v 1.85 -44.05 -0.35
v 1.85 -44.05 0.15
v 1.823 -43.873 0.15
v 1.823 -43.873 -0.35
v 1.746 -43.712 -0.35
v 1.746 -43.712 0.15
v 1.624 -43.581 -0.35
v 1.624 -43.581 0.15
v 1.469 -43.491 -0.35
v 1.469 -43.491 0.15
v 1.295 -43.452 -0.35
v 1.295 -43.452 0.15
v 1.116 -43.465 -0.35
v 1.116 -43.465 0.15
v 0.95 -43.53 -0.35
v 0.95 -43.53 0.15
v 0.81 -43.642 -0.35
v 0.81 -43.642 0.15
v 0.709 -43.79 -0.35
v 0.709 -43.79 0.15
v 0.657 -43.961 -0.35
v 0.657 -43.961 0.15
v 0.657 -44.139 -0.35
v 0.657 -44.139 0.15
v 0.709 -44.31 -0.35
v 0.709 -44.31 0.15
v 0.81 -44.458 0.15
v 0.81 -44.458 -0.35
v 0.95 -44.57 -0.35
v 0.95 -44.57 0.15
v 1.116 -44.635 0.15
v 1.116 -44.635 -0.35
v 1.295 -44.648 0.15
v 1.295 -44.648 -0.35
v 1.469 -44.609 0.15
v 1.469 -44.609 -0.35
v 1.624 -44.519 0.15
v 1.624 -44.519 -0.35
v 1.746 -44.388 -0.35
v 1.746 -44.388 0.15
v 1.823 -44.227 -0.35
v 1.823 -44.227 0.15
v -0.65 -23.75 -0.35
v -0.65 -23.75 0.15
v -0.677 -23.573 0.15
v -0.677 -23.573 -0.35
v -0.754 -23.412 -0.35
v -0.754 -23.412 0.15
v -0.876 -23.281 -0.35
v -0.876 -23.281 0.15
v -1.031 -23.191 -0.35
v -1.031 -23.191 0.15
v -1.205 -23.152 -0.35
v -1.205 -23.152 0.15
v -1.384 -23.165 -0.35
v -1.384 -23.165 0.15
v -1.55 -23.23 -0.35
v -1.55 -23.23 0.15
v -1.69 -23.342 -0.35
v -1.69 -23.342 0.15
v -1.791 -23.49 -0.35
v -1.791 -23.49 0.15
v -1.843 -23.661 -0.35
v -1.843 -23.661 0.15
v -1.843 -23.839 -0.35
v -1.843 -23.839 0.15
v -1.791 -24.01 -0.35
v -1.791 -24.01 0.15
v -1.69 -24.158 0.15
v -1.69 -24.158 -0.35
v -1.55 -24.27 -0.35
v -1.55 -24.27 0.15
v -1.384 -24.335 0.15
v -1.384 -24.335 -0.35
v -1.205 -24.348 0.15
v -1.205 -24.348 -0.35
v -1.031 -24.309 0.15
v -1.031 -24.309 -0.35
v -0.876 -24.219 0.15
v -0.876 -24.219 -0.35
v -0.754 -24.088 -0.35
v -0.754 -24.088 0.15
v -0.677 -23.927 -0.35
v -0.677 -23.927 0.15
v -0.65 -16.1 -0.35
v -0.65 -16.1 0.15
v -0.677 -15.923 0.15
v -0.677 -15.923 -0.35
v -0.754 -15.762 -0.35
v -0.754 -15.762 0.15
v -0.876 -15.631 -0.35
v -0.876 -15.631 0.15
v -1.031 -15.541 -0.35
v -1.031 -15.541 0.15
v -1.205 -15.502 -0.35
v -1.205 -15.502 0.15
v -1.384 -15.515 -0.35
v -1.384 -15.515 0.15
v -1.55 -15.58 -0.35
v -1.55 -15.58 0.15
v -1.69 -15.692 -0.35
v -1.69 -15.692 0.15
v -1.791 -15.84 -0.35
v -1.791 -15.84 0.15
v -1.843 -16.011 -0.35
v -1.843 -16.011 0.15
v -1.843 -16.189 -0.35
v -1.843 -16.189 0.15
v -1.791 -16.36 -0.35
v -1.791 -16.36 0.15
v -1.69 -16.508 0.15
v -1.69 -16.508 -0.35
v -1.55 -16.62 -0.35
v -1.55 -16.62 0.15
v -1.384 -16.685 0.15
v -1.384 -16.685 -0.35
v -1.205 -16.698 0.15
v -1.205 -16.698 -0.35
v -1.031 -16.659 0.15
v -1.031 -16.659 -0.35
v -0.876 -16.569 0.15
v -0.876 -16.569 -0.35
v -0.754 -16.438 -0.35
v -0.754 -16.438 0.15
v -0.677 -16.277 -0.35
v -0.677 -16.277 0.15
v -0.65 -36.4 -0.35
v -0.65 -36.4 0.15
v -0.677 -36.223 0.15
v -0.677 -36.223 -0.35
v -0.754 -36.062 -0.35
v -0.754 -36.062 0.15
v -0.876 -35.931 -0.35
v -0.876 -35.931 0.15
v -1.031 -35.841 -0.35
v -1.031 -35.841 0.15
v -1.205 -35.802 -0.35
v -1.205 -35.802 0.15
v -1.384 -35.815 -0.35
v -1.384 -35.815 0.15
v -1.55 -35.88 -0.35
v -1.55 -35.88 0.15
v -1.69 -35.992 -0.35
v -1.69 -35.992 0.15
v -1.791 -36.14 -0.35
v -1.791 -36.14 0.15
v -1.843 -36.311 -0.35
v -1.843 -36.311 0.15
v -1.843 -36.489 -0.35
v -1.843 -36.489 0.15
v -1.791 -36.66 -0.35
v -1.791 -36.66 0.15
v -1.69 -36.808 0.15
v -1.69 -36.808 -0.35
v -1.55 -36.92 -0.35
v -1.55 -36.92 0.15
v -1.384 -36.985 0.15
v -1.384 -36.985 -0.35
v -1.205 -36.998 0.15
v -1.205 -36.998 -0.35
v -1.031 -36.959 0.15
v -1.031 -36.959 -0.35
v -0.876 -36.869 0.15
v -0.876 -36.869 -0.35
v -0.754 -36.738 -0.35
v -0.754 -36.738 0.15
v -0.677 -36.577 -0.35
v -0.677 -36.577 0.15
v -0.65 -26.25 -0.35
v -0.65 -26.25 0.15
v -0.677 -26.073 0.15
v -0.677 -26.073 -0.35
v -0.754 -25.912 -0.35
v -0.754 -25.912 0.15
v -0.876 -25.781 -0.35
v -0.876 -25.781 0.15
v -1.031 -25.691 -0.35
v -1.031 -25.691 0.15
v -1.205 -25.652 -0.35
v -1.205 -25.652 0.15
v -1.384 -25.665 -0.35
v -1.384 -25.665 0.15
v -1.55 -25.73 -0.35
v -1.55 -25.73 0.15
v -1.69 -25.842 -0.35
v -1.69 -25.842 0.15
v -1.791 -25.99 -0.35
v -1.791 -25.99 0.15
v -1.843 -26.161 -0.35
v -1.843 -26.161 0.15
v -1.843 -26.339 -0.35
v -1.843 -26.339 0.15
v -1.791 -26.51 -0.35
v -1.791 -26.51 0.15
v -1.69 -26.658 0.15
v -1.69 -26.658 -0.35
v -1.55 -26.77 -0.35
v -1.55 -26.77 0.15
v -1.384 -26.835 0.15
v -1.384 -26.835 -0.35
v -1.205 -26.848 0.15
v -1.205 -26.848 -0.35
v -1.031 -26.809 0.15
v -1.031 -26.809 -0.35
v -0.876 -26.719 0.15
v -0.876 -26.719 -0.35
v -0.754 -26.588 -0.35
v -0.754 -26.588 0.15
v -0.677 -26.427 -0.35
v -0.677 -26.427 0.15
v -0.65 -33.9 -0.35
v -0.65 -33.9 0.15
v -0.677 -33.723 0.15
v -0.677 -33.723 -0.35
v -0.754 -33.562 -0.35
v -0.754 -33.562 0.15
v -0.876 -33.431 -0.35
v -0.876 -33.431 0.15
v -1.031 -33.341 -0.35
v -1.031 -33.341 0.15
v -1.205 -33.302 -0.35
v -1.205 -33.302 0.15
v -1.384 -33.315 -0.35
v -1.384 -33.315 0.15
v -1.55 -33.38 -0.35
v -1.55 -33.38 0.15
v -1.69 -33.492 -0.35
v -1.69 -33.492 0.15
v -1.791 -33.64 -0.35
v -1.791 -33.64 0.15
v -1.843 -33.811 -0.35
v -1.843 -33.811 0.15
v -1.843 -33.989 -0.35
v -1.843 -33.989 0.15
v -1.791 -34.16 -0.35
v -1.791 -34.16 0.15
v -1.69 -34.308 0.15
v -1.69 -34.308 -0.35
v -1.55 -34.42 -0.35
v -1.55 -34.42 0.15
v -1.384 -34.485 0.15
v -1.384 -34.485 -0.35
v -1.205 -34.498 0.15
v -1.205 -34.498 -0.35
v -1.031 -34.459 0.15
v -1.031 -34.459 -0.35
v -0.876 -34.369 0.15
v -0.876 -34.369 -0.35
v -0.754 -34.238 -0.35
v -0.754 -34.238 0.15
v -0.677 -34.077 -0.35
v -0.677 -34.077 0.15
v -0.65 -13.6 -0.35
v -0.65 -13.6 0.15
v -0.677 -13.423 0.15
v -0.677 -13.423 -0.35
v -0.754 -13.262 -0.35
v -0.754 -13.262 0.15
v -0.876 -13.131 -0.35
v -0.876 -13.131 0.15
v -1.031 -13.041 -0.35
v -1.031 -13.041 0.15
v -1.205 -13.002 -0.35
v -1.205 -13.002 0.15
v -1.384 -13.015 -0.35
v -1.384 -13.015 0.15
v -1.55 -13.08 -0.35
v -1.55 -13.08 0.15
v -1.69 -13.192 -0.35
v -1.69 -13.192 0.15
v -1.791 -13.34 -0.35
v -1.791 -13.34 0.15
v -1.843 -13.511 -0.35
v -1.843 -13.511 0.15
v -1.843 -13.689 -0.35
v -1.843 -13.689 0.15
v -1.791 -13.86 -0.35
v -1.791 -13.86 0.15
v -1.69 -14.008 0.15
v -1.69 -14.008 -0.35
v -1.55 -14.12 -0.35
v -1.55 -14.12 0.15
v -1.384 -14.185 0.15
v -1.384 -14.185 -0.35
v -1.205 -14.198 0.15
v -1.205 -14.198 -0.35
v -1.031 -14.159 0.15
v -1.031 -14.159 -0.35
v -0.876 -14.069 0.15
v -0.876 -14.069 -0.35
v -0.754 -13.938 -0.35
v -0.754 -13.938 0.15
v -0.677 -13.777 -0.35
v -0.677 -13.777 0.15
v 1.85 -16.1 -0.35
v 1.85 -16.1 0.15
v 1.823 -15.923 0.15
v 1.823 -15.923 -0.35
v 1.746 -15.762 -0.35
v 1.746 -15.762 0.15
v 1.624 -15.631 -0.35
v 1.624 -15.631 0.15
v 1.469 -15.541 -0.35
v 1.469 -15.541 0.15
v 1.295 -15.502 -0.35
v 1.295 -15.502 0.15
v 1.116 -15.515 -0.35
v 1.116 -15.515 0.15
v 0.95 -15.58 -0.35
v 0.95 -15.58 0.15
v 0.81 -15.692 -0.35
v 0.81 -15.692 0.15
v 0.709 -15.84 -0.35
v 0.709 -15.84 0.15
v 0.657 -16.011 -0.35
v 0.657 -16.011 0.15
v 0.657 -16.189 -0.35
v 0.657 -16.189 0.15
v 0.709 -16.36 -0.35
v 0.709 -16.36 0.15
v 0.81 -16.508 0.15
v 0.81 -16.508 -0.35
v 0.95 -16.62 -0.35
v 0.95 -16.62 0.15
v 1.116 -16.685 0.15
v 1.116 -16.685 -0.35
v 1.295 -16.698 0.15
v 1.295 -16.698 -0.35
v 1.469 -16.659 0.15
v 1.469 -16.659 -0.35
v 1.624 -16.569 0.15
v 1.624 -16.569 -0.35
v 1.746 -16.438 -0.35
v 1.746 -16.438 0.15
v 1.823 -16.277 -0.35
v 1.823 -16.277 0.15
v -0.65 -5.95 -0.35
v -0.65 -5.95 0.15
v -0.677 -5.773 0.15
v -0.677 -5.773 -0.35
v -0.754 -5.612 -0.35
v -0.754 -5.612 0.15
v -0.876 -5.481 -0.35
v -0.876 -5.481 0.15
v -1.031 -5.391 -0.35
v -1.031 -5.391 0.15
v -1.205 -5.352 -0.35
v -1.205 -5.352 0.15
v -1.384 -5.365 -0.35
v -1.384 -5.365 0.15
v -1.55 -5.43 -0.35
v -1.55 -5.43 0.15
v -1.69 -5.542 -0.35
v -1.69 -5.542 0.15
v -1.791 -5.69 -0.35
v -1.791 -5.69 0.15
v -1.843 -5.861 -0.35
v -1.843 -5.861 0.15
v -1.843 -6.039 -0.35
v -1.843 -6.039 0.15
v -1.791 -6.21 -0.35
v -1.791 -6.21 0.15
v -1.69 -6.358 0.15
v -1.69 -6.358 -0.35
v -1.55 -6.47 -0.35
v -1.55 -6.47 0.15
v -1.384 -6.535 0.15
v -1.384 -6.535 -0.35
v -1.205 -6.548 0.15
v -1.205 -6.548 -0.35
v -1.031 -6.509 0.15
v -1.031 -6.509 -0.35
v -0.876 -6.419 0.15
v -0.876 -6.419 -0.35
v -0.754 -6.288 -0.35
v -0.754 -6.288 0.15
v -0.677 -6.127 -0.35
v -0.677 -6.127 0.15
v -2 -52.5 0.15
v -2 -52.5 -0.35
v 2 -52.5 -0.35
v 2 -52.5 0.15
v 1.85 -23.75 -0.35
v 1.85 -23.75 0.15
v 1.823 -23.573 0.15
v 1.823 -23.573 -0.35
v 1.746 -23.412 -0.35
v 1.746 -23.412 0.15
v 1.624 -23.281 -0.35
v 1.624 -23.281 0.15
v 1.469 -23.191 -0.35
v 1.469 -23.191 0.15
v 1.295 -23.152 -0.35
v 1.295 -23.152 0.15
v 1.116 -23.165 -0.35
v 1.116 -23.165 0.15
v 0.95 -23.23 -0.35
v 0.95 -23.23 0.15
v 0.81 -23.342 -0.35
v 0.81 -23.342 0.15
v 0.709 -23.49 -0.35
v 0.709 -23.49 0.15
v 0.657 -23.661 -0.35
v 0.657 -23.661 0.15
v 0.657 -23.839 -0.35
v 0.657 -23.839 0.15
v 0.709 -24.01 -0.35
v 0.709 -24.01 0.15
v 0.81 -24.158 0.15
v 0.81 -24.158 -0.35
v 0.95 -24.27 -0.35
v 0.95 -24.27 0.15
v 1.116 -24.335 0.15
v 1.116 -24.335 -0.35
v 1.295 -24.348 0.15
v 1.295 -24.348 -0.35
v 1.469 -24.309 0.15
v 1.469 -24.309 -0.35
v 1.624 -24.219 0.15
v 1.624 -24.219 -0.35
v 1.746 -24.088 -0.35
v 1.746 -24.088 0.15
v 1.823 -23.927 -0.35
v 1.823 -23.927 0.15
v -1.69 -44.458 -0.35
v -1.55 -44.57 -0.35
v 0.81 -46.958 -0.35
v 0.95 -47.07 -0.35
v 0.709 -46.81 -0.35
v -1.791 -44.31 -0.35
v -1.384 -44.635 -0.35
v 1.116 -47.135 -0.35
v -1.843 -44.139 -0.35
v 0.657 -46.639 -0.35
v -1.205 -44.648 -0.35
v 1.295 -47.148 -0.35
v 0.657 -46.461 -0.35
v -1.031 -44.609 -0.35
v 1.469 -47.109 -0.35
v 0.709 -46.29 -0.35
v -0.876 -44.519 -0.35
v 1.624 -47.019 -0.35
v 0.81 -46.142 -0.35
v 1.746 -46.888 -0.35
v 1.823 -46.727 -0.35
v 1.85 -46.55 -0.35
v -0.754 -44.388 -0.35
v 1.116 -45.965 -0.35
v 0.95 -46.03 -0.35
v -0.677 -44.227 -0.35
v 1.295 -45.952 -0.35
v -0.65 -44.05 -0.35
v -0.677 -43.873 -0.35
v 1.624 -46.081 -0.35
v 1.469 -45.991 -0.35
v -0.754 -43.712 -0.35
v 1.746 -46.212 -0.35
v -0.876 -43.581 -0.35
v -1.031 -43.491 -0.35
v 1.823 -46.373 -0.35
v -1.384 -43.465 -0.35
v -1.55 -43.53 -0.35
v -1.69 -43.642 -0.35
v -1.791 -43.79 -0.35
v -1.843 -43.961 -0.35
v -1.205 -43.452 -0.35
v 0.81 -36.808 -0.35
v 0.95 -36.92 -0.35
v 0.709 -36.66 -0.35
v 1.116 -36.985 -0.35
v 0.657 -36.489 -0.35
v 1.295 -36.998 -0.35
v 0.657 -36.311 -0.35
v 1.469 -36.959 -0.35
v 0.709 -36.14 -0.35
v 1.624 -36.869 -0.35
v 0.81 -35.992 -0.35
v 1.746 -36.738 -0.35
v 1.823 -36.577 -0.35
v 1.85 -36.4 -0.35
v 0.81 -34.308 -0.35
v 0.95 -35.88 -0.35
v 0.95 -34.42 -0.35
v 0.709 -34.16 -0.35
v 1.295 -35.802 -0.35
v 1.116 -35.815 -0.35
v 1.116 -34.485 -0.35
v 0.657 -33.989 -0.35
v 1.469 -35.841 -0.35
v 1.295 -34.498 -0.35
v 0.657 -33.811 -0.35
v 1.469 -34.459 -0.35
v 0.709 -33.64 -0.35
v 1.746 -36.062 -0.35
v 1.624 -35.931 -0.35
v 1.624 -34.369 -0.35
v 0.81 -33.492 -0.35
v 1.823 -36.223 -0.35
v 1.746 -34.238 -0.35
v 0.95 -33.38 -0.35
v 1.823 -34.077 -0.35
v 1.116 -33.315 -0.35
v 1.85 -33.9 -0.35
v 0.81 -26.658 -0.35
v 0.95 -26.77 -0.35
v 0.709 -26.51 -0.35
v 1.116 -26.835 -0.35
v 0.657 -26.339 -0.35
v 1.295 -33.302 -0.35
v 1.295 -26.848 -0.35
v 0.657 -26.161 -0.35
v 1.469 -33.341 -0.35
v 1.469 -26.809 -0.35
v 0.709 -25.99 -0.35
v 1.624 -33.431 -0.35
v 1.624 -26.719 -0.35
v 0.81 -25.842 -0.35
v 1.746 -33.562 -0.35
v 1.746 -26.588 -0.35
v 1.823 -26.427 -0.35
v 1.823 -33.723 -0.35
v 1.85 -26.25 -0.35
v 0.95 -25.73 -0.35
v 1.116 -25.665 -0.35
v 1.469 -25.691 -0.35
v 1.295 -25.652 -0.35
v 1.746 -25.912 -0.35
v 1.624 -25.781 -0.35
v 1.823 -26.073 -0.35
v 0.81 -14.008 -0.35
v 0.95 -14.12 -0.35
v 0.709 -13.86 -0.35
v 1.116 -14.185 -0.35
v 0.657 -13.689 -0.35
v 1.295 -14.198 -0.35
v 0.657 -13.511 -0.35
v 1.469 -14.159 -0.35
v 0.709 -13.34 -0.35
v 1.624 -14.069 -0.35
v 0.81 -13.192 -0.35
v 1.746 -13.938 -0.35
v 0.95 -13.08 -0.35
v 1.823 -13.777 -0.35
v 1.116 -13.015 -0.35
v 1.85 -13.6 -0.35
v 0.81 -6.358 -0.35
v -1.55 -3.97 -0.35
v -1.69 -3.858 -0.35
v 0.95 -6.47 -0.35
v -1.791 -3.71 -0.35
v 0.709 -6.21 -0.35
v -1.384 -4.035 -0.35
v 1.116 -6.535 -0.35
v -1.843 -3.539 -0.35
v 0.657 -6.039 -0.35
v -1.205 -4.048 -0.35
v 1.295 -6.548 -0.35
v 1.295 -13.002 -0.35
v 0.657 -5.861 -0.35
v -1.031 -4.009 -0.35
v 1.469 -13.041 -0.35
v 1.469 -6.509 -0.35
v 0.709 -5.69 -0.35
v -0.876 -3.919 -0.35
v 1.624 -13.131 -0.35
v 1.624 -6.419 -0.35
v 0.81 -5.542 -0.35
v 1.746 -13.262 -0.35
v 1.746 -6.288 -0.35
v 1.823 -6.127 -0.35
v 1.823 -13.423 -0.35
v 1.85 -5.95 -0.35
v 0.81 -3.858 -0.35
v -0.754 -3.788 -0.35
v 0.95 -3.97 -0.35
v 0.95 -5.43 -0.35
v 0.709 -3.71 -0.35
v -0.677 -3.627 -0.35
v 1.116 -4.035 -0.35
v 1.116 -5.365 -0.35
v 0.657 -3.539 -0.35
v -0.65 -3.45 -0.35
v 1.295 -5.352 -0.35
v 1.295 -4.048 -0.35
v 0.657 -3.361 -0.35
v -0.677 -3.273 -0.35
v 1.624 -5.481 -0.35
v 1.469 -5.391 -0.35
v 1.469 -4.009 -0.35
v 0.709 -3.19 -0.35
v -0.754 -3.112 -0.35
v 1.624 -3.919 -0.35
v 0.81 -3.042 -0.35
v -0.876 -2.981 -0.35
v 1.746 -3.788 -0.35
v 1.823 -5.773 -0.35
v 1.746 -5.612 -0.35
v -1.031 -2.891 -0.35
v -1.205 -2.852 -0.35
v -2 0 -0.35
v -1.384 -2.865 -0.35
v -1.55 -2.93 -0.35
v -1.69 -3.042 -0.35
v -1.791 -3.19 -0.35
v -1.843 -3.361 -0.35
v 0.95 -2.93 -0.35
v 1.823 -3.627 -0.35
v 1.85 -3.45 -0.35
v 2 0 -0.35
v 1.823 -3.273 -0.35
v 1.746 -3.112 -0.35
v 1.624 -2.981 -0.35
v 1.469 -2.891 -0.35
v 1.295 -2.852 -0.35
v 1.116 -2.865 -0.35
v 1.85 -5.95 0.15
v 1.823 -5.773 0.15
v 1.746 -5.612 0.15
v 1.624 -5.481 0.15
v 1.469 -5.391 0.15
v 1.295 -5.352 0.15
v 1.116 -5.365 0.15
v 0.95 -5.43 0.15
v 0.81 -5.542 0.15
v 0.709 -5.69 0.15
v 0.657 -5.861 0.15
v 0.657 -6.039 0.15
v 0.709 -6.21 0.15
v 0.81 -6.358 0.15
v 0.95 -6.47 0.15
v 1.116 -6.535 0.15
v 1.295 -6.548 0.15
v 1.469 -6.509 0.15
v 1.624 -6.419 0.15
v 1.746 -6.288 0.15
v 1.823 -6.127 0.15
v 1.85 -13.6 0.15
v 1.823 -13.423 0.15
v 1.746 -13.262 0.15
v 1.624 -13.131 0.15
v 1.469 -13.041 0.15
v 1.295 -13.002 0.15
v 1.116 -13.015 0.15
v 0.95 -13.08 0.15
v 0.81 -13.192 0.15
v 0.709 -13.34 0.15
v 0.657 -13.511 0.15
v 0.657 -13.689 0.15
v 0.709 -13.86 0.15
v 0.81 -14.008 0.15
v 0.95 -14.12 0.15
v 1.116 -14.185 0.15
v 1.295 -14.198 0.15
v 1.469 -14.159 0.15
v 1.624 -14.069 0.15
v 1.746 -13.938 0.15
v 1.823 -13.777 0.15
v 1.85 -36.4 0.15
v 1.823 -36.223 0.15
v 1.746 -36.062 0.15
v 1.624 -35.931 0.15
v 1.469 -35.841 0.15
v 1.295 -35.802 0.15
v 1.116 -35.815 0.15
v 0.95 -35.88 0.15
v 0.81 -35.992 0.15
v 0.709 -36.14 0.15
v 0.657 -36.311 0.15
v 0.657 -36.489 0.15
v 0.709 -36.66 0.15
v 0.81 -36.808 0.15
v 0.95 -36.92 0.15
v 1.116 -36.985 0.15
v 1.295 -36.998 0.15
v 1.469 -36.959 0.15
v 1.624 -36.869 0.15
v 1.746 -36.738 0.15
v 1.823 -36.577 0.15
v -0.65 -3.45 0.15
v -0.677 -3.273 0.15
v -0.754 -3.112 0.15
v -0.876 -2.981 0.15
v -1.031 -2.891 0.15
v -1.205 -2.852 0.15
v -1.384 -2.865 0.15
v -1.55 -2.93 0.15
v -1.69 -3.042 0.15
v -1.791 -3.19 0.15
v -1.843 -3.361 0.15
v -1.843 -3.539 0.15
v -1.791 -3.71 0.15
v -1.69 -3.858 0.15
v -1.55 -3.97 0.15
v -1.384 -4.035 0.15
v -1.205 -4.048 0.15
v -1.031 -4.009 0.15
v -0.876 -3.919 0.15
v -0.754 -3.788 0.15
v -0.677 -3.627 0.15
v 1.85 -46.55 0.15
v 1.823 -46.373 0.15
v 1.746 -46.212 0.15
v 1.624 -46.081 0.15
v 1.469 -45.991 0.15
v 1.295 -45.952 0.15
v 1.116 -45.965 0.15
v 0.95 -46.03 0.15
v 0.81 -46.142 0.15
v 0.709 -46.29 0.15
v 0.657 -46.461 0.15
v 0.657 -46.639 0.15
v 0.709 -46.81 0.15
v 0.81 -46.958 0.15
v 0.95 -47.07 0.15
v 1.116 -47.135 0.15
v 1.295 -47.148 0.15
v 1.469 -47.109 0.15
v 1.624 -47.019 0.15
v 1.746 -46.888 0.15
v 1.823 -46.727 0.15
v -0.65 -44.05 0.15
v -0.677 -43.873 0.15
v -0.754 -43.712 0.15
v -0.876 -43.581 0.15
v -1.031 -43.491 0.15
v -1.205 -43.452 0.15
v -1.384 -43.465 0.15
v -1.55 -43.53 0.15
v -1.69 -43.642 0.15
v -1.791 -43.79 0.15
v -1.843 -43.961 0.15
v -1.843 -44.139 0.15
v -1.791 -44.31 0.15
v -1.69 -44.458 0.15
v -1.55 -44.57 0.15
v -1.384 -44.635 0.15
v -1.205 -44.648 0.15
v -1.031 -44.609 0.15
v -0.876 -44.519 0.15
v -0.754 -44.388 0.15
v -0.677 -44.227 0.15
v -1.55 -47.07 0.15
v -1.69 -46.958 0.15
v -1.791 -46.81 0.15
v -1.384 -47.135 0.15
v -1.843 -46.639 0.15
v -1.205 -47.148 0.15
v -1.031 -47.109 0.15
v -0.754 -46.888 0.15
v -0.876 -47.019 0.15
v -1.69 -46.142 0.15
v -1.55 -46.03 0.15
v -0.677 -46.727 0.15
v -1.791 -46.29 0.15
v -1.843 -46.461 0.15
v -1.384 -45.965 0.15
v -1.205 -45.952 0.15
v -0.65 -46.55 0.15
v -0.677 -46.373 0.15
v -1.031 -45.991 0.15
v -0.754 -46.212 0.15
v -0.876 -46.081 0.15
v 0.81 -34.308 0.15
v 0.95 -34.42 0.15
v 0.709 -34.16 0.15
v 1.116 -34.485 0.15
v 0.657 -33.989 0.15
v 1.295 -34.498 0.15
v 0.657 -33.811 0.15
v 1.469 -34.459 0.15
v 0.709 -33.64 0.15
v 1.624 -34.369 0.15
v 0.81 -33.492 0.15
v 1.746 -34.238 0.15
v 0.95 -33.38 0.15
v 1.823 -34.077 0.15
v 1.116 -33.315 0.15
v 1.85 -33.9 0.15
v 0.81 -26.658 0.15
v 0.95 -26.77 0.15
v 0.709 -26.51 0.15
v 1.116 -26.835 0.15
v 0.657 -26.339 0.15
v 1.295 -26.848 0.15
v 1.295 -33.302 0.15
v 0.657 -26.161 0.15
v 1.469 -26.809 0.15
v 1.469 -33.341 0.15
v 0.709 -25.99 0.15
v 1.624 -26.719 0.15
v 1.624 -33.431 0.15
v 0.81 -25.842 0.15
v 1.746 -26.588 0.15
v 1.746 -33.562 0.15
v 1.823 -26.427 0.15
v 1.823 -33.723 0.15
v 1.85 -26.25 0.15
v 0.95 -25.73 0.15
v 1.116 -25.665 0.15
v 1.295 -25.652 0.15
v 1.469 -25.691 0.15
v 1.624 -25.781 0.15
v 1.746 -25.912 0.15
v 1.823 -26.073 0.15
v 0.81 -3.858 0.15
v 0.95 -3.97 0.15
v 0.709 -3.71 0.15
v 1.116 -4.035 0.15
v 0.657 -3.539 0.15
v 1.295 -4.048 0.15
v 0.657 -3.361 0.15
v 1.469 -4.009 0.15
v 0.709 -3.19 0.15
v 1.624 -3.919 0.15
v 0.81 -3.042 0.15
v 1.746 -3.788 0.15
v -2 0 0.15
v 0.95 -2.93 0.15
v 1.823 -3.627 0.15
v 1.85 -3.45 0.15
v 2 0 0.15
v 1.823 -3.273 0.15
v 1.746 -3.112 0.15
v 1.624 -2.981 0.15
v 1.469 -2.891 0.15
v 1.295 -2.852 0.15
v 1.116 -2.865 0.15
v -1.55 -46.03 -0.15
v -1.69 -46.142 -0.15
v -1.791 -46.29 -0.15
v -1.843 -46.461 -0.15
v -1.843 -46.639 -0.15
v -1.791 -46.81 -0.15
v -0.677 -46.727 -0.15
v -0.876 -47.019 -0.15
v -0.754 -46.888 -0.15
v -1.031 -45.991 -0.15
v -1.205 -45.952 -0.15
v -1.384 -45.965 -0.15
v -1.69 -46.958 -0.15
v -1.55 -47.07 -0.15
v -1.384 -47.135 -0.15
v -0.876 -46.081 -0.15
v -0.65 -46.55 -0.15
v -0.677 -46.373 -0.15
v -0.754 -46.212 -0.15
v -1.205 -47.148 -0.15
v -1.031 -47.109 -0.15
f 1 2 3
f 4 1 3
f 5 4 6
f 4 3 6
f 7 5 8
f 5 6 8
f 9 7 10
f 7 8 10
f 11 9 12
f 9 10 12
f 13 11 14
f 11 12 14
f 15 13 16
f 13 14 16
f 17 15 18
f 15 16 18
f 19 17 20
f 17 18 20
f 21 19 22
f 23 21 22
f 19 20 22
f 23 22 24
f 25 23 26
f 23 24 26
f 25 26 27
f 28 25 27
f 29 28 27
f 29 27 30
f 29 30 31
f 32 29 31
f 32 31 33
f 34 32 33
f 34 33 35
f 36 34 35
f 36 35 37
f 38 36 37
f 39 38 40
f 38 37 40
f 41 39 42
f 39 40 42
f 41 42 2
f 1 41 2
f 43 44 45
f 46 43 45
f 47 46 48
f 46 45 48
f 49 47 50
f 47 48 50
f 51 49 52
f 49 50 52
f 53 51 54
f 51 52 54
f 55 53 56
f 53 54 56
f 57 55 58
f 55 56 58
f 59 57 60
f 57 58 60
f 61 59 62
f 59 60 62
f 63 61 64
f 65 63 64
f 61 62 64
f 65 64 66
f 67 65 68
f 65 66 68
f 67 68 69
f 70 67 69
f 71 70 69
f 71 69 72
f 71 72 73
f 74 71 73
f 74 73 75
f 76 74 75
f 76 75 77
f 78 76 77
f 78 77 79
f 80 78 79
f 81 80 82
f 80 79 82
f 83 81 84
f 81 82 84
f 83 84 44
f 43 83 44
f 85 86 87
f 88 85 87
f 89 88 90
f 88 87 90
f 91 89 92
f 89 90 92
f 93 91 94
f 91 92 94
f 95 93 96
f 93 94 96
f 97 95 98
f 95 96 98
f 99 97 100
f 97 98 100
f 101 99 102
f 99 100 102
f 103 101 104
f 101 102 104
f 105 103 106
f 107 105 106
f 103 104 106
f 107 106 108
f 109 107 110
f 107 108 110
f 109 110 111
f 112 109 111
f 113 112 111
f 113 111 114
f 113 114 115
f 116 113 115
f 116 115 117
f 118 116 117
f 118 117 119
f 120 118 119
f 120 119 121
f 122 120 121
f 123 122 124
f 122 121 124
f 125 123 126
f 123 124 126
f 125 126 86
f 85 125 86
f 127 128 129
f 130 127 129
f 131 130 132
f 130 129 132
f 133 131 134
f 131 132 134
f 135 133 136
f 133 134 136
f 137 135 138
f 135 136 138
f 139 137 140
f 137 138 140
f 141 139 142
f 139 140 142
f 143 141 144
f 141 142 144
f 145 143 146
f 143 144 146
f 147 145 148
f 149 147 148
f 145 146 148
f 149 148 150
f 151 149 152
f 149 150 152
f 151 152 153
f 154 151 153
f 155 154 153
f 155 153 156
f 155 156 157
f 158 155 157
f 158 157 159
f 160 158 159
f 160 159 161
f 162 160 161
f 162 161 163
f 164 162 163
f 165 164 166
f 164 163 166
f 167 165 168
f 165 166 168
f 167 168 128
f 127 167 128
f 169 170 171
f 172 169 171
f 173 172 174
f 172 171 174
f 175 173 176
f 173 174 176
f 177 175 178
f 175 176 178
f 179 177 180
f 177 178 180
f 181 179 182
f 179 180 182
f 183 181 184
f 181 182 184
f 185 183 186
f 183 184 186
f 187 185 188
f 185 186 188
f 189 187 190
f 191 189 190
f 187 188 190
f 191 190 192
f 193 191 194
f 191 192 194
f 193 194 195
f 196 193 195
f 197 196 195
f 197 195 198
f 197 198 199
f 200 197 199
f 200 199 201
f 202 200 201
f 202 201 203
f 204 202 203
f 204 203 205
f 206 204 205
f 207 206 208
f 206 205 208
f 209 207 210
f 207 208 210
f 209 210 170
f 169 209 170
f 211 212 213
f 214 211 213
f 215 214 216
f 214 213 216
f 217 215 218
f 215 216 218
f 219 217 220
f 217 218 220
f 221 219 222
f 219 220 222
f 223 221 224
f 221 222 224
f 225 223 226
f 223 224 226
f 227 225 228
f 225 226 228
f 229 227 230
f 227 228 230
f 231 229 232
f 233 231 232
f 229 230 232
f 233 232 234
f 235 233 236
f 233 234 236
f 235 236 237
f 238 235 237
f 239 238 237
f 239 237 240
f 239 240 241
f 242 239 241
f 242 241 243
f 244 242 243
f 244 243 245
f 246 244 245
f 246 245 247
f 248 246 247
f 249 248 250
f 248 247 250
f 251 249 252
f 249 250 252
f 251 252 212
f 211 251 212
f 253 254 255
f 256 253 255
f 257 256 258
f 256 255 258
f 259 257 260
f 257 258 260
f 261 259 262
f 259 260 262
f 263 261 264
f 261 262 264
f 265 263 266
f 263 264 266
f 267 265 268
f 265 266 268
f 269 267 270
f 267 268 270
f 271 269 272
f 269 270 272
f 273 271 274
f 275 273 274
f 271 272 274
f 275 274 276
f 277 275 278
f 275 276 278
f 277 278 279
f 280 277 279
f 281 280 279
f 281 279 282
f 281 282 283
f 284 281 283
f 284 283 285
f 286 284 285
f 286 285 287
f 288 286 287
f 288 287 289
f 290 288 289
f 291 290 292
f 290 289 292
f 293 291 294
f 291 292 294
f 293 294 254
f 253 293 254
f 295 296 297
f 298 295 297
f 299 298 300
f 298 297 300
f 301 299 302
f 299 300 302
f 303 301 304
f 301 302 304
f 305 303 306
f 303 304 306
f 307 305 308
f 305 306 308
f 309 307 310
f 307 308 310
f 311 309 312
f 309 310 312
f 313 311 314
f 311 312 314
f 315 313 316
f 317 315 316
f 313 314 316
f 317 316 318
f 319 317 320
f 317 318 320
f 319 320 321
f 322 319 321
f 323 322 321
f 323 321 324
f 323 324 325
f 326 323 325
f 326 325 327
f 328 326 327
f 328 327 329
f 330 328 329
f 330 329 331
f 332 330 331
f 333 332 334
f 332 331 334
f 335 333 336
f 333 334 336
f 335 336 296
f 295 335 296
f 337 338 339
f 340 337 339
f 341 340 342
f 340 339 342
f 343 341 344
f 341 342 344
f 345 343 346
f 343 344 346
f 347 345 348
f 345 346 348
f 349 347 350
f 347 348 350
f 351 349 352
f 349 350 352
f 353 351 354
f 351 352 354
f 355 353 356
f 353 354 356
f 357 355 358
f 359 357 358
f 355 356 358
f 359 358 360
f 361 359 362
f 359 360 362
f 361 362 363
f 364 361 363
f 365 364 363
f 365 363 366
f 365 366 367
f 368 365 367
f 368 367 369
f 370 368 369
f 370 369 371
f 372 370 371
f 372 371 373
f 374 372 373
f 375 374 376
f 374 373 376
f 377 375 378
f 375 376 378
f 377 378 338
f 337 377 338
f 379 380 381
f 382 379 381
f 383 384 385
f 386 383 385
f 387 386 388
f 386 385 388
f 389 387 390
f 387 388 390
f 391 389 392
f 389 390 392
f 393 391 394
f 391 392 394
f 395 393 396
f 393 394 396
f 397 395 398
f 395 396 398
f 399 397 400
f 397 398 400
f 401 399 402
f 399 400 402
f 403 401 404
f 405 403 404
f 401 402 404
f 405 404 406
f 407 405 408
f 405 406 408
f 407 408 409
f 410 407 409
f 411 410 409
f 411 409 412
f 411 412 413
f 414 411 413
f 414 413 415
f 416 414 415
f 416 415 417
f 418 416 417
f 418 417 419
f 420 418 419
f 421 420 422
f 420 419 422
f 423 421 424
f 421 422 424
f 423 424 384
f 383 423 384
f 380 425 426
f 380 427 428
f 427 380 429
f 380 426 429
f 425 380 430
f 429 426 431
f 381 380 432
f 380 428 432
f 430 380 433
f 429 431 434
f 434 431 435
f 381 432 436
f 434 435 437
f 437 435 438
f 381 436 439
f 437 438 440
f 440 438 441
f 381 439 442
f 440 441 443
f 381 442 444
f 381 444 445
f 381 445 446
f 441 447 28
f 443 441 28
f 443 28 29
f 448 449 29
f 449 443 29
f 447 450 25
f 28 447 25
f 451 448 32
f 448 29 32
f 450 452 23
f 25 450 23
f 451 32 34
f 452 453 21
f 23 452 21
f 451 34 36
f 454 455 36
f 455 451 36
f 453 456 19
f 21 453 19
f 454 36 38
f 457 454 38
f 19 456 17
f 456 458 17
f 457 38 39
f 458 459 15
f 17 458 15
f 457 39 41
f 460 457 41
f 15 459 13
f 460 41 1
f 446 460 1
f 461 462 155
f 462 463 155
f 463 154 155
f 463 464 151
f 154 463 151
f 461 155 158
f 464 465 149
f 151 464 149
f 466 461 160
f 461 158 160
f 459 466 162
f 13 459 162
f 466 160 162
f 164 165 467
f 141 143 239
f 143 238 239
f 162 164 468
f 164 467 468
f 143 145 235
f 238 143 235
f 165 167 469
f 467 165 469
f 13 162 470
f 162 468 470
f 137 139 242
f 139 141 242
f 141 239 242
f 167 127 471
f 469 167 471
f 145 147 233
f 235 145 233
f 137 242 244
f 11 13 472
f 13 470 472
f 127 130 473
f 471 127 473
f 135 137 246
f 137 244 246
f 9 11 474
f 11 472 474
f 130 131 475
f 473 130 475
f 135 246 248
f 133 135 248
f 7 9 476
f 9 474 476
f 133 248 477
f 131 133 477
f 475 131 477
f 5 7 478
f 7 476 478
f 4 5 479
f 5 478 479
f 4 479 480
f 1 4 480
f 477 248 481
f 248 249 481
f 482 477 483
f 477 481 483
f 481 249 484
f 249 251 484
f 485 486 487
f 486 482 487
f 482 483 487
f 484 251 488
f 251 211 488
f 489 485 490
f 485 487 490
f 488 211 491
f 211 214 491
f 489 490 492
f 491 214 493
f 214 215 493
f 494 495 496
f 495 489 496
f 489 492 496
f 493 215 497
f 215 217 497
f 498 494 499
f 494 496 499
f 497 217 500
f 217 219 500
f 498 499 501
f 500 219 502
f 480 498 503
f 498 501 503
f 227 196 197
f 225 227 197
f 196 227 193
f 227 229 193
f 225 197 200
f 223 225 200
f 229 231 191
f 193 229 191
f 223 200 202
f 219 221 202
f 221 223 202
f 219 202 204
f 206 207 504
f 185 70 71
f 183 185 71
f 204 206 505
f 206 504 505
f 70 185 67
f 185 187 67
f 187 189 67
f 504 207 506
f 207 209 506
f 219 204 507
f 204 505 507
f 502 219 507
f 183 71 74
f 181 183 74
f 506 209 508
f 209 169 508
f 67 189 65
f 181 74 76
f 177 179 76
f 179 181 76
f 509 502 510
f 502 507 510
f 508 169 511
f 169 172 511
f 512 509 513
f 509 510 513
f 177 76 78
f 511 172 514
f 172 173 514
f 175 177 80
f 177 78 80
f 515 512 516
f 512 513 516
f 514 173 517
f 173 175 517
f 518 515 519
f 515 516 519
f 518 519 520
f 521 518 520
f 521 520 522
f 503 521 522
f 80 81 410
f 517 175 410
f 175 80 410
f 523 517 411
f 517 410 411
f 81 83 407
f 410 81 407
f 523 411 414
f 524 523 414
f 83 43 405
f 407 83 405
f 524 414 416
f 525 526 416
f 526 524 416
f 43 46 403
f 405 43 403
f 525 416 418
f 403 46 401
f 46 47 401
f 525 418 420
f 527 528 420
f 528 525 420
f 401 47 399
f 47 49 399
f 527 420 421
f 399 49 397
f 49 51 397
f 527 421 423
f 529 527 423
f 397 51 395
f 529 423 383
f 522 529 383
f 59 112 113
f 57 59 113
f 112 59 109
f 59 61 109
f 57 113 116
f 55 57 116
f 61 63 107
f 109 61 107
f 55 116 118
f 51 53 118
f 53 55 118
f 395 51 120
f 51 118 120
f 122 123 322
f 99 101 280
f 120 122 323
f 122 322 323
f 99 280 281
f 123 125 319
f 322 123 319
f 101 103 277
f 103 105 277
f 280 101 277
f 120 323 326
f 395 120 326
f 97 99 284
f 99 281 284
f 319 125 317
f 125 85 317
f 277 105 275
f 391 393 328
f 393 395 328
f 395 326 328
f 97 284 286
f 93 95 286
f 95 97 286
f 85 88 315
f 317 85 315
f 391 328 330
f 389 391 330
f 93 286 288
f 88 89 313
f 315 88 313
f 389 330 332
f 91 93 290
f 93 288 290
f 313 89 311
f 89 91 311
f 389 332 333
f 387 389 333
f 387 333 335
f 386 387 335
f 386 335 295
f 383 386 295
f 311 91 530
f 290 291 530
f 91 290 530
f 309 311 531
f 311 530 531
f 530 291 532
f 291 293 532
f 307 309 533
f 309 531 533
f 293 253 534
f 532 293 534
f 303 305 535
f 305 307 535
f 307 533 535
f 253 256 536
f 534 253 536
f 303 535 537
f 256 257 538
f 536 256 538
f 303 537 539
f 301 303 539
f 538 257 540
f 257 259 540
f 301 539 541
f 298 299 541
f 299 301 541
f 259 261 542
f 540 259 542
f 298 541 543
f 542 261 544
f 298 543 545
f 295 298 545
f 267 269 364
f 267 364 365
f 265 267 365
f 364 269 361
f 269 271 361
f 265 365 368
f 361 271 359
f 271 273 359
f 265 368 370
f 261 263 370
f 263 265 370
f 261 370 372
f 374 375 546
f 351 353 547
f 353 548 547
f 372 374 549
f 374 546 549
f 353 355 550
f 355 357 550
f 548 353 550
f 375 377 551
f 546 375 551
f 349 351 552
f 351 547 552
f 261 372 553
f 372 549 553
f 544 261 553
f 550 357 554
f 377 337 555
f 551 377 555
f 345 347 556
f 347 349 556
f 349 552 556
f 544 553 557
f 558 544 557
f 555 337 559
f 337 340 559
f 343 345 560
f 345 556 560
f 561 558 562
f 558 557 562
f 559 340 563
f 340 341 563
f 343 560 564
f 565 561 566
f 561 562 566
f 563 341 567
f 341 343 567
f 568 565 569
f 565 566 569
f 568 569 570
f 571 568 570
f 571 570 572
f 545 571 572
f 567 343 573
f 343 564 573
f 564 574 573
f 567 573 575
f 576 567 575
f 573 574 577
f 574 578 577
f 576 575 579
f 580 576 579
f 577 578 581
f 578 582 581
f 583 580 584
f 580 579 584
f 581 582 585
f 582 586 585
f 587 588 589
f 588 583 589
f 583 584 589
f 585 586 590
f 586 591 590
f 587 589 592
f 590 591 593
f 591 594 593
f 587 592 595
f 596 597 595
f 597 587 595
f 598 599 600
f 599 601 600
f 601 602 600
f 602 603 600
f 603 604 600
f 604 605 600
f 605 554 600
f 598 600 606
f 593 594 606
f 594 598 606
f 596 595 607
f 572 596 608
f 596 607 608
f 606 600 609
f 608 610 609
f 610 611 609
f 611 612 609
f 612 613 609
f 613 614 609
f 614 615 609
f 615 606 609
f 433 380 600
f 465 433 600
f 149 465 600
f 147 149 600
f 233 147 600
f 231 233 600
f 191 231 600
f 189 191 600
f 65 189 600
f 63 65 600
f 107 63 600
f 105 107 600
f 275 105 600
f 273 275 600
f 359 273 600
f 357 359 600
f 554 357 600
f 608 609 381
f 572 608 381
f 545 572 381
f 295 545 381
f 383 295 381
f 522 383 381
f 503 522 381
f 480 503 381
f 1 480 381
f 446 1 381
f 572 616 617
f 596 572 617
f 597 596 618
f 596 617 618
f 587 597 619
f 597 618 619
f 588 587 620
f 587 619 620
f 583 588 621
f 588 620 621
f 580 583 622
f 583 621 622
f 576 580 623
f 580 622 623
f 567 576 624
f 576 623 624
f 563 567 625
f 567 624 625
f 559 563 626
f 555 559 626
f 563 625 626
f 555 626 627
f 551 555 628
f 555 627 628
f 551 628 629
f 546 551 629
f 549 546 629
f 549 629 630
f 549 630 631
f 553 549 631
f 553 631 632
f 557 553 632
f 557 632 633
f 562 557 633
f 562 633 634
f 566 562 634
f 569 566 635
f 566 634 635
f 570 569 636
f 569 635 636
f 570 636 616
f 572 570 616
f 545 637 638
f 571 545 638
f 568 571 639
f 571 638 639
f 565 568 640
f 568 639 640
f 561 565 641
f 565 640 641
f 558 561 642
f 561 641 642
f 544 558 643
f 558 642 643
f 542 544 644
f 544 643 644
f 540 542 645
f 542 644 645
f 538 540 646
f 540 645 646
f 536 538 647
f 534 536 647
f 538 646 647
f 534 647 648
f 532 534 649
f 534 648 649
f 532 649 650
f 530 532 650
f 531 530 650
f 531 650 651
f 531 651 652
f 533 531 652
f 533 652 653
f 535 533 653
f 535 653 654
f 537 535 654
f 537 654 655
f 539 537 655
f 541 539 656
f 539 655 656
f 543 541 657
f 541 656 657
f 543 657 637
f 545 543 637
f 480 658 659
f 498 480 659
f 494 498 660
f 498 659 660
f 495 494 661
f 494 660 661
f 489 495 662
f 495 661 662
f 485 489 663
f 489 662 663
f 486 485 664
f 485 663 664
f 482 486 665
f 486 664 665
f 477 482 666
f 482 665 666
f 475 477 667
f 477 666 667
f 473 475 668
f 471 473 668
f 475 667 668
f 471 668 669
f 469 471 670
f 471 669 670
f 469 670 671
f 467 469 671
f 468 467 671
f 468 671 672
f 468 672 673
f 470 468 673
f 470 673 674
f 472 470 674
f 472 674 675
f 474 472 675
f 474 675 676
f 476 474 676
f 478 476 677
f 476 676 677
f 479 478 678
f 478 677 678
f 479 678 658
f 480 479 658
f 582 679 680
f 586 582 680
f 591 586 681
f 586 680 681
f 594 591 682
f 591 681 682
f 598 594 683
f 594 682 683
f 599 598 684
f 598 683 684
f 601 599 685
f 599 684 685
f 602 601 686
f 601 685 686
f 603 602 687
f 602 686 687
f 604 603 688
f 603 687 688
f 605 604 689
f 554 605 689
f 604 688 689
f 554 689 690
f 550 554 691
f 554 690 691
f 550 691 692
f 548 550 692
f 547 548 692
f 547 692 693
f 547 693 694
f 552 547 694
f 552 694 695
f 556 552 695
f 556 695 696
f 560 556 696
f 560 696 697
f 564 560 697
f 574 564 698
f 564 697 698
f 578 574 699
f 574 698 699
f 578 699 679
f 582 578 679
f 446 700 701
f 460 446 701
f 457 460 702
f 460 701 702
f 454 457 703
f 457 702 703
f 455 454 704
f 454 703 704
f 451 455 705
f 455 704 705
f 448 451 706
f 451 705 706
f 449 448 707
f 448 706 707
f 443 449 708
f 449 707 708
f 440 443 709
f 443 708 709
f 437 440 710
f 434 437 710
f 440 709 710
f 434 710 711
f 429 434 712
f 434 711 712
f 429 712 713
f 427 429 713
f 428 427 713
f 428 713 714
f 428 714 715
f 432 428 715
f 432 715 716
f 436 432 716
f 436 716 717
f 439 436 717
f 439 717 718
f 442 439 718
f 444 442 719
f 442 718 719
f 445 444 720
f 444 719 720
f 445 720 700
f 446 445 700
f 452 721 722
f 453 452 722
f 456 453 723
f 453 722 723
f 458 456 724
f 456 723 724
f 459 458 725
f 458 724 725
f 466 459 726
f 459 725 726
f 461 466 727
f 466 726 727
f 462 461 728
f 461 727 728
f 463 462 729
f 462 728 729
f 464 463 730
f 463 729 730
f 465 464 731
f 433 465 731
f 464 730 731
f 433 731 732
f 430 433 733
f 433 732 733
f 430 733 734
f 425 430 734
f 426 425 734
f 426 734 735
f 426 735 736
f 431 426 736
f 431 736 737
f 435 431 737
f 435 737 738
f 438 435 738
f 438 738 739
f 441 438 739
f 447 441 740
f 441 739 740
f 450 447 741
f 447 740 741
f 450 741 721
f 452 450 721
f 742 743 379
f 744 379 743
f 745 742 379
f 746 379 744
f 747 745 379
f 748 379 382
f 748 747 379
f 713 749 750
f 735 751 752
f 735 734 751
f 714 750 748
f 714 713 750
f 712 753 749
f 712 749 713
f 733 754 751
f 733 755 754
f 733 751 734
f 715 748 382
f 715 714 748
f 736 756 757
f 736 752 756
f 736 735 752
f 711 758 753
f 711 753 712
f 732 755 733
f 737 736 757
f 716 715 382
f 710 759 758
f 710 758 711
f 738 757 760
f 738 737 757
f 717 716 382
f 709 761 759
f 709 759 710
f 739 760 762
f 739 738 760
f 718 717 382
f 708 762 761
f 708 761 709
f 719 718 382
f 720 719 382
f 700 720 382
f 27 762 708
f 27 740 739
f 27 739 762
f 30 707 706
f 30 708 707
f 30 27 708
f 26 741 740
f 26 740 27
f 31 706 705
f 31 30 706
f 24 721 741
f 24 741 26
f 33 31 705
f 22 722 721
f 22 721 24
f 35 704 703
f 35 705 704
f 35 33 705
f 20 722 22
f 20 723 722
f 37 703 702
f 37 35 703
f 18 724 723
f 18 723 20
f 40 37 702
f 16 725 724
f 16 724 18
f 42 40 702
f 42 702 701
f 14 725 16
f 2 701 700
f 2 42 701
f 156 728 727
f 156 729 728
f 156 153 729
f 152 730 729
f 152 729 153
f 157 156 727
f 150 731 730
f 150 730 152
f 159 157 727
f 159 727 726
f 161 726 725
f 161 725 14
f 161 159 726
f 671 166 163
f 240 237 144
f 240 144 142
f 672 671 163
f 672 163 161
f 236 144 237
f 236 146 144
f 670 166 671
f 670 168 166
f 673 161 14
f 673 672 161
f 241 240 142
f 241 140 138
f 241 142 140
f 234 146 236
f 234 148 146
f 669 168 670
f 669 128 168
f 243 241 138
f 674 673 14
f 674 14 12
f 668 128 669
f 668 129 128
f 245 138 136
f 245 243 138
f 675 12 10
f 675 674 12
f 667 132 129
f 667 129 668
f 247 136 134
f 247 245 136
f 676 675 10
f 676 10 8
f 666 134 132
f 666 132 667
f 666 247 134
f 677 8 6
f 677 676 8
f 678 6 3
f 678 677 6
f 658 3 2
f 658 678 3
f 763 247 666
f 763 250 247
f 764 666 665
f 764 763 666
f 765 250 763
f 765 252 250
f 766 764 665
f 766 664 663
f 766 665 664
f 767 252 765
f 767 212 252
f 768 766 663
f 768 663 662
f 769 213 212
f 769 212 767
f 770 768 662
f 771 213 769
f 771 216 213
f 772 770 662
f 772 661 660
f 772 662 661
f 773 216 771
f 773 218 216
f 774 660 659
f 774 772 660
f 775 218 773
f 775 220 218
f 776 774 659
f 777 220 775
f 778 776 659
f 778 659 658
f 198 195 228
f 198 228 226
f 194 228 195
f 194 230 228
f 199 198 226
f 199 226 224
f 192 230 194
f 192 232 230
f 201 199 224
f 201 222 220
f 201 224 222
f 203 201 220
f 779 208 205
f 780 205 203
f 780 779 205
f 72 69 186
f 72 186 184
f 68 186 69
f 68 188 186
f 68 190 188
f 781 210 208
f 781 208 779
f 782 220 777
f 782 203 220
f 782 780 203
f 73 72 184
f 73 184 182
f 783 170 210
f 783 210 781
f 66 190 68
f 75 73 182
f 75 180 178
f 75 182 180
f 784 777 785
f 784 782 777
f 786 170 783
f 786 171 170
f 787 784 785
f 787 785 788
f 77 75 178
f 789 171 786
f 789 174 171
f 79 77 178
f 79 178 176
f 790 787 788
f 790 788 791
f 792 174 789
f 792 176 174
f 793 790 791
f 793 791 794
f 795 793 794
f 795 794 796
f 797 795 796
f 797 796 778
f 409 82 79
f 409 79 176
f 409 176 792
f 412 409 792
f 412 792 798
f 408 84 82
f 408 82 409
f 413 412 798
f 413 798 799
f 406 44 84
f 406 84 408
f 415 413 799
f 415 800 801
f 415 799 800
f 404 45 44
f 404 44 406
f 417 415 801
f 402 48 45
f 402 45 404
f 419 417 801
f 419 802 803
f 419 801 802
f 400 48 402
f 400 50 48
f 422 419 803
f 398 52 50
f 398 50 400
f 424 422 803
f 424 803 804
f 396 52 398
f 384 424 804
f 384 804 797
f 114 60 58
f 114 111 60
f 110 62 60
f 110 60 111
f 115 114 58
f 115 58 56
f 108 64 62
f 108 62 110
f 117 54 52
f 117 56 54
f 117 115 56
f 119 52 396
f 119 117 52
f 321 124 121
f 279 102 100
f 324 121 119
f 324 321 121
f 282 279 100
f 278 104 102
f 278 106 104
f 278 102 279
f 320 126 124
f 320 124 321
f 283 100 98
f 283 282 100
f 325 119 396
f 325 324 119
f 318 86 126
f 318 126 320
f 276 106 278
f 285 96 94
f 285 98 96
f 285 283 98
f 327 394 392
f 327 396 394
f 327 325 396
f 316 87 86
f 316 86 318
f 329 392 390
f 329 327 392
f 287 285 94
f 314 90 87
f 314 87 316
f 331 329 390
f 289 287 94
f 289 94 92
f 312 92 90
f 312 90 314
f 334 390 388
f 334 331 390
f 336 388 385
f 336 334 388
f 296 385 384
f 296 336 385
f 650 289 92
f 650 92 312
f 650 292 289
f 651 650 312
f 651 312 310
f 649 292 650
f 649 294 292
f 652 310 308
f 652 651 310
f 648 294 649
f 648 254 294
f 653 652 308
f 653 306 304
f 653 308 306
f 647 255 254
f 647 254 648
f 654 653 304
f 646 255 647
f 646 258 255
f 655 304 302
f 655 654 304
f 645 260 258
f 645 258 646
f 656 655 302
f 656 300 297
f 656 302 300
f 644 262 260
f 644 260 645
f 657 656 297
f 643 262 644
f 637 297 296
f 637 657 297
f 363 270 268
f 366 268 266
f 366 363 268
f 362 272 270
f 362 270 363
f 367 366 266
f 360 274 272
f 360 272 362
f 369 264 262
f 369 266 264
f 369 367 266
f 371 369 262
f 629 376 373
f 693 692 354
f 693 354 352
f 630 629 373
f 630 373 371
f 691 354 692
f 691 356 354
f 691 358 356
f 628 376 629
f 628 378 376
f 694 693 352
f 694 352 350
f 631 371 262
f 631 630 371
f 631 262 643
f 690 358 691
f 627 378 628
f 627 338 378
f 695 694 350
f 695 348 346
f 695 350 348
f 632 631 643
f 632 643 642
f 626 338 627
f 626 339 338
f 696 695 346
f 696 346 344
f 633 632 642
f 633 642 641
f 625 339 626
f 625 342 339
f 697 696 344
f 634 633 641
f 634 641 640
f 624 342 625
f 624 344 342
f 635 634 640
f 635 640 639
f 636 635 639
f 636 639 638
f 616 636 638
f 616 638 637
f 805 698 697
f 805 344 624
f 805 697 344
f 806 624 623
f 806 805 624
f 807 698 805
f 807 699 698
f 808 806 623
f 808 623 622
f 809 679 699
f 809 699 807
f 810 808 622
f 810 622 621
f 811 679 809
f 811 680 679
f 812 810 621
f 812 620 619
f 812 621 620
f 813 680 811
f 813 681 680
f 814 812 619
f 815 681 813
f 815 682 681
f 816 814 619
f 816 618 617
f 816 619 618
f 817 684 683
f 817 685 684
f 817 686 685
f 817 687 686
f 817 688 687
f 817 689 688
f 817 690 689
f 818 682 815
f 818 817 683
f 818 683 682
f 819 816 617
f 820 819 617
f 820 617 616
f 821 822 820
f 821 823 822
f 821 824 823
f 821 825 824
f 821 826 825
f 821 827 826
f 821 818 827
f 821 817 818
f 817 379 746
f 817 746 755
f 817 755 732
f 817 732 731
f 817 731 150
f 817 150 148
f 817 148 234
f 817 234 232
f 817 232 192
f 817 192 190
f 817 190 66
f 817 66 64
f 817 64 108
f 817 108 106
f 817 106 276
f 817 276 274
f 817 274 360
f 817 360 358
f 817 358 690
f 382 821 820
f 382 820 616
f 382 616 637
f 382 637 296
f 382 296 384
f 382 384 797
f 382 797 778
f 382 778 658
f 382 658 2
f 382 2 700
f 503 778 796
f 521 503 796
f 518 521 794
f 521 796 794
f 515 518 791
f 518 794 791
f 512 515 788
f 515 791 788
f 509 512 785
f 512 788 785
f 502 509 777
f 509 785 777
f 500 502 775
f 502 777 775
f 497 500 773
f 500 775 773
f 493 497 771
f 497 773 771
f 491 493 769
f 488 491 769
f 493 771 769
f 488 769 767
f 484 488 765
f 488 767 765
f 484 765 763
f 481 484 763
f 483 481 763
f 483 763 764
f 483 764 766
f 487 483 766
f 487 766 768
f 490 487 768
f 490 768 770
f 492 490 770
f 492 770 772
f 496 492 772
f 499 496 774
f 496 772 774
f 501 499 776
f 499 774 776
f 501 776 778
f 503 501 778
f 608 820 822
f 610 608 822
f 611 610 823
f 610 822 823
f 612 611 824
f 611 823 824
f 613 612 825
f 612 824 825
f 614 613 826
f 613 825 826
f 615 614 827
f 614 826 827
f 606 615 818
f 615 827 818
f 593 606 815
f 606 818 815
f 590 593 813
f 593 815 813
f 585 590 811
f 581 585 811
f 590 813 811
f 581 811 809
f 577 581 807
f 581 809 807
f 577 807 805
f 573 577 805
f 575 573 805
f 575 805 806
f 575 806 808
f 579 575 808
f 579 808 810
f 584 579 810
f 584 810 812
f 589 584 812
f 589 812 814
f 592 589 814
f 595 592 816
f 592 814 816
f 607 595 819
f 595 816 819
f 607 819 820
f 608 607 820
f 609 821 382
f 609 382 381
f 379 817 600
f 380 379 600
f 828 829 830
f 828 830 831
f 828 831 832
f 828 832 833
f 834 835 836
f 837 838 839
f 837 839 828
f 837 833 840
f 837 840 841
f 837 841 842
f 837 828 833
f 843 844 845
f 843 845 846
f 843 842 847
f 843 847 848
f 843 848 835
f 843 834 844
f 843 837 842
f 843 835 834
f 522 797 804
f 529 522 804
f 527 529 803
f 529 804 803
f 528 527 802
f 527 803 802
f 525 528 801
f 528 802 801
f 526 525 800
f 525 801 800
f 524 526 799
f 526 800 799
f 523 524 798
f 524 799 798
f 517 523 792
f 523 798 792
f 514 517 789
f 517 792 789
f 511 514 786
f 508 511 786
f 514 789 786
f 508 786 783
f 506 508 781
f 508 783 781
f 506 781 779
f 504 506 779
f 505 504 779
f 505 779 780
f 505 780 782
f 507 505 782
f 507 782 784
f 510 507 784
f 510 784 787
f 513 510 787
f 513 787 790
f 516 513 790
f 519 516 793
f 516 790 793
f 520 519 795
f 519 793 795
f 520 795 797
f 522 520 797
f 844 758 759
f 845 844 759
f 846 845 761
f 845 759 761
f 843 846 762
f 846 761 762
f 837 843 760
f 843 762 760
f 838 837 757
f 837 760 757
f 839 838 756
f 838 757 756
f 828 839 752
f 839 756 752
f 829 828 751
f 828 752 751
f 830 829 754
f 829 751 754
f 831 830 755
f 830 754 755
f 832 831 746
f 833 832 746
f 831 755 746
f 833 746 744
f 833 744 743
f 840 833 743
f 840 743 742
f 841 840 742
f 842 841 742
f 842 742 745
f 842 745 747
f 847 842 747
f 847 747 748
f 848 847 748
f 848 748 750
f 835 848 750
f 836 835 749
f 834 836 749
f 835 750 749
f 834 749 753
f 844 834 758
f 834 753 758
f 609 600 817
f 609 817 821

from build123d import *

# Parameters (mm, degrees)
SKETCH3_W           = 4
SKETCH3_H           = 0.5
BOSS_EXTRUDE1_DEPTH = 52.5
SKETCH4_R           = 0.6
CUT_EXTRUDE1_DEPTH  = 0.5
SKETCH5_R           = 0.6
CUT_EXTRUDE2_DEPTH  = 0.5
SKETCH6_R           = 0.6
CUT_EXTRUDE3_DEPTH  = 0.5
SKETCH7_R           = 0.6
CUT_EXTRUDE4_DEPTH  = 0.5
SKETCH8_R           = 0.6
CUT_EXTRUDE5_DEPTH  = 0.5
SKETCH9_R           = 0.6
CUT_EXTRUDE6_DEPTH  = 0.5
SKETCH10_R          = 0.6
CUT_EXTRUDE7_DEPTH  = 0.5
SKETCH11_R          = 0.6
CUT_EXTRUDE8_DEPTH  = 0.5
SKETCH12_R          = 0.6
CUT_EXTRUDE9_DEPTH  = 0.5
SKETCH13_R          = 0.6
CUT_EXTRUDE10_DEPTH = 0.5
SKETCH14_R          = 0.6
CUT_EXTRUDE11_DEPTH = 0.5
SKETCH15_R          = 0.6
CUT_EXTRUDE12_DEPTH = 0.5
SKETCH16_R          = 0.6
CUT_EXTRUDE13_DEPTH = 0.5
SKETCH17_R          = 0.6
CUT_EXTRUDE14_DEPTH = 0.5
SKETCH18_R          = 0.6
CUT_EXTRUDE15_DEPTH = 0.5
SKETCH19_R          = 0.6
CUT_EXTRUDE16_DEPTH = 0.5
SKETCH20_R          = 0.6
CUT_EXTRUDE17_DEPTH = 0.5
SKETCH21_R          = 0.6
CUT_EXTRUDE18_DEPTH = 0.5
SKETCH22_R          = 0.6
CUT_EXTRUDE19_DEPTH = 0.5
SKETCH23_R          = 0.6
CUT_EXTRUDE20_DEPTH = 0.3


with BuildPart() as part:
    # Sketch3 → Boss-Extrude1 (new body)
    with BuildSketch(Plane(origin=(0, 0, 0), x_dir=(1, 0, 0), z_dir=(0, 1, 0))):
        with Locations((0, 0.1)):
            Rectangle(SKETCH3_W, SKETCH3_H)
    extrude(amount=-BOSS_EXTRUDE1_DEPTH)

    # Sketch4 → Cut-Extrude1 (cut)
    with BuildSketch(Plane.XY.offset(0.15)):
        with Locations((1.25, -3.45)):
            Circle(SKETCH4_R)
    extrude(amount=-CUT_EXTRUDE1_DEPTH, mode=Mode.SUBTRACT)

    # Sketch5 → Cut-Extrude2 (cut)
    with BuildSketch(Plane.XY.offset(0.15)):
        with Locations((1.25, -5.95)):
            Circle(SKETCH5_R)
    extrude(amount=-CUT_EXTRUDE2_DEPTH, mode=Mode.SUBTRACT)

    # Sketch6 → Cut-Extrude3 (cut)
    with BuildSketch(Plane.XY.offset(0.15)):
        with Locations((1.25, -13.6)):
            Circle(SKETCH6_R)
    extrude(amount=-CUT_EXTRUDE3_DEPTH, mode=Mode.SUBTRACT)

    # Sketch7 → Cut-Extrude4 (cut)
    with BuildSketch(Plane.XY.offset(0.15)):
        with Locations((1.25, -16.1)):
            Circle(SKETCH7_R)
    extrude(amount=-CUT_EXTRUDE4_DEPTH, mode=Mode.SUBTRACT)

    # Sketch8 → Cut-Extrude5 (cut)
    with BuildSketch(Plane.XY.offset(0.15)):
        with Locations((1.25, -23.75)):
            Circle(SKETCH8_R)
    extrude(amount=-CUT_EXTRUDE5_DEPTH, mode=Mode.SUBTRACT)

    # Sketch9 → Cut-Extrude6 (cut)
    with BuildSketch(Plane.XY.offset(0.15)):
        with Locations((1.25, -26.25)):
            Circle(SKETCH9_R)
    extrude(amount=-CUT_EXTRUDE6_DEPTH, mode=Mode.SUBTRACT)

    # Sketch10 → Cut-Extrude7 (cut)
    with BuildSketch(Plane.XY.offset(0.15)):
        with Locations((1.25, -33.9)):
            Circle(SKETCH10_R)
    extrude(amount=-CUT_EXTRUDE7_DEPTH, mode=Mode.SUBTRACT)

    # Sketch11 → Cut-Extrude8 (cut)
    with BuildSketch(Plane.XY.offset(0.15)):
        with Locations((1.25, -36.4)):
            Circle(SKETCH11_R)
    extrude(amount=-CUT_EXTRUDE8_DEPTH, mode=Mode.SUBTRACT)

    # Sketch12 → Cut-Extrude9 (cut)
    with BuildSketch(Plane.XY.offset(0.15)):
        with Locations((1.25, -44.05)):
            Circle(SKETCH12_R)
    extrude(amount=-CUT_EXTRUDE9_DEPTH, mode=Mode.SUBTRACT)

    # Sketch13 → Cut-Extrude10 (cut)
    with BuildSketch(Plane.XY.offset(0.15)):
        with Locations((1.25, -46.55)):
            Circle(SKETCH13_R)
    extrude(amount=-CUT_EXTRUDE10_DEPTH, mode=Mode.SUBTRACT)

    # Sketch14 → Cut-Extrude11 (cut)
    with BuildSketch(Plane.XY.offset(0.15)):
        with Locations((-1.25, -3.45)):
            Circle(SKETCH14_R)
    extrude(amount=-CUT_EXTRUDE11_DEPTH, mode=Mode.SUBTRACT)

    # Sketch15 → Cut-Extrude12 (cut)
    with BuildSketch(Plane.XY.offset(0.15)):
        with Locations((-1.25, -5.95)):
            Circle(SKETCH15_R)
    extrude(amount=-CUT_EXTRUDE12_DEPTH, mode=Mode.SUBTRACT)

    # Sketch16 → Cut-Extrude13 (cut)
    with BuildSketch(Plane.XY.offset(0.15)):
        with Locations((-1.25, -13.6)):
            Circle(SKETCH16_R)
    extrude(amount=-CUT_EXTRUDE13_DEPTH, mode=Mode.SUBTRACT)

    # Sketch17 → Cut-Extrude14 (cut)
    with BuildSketch(Plane.XY.offset(0.15)):
        with Locations((-1.25, -16.1)):
            Circle(SKETCH17_R)
    extrude(amount=-CUT_EXTRUDE14_DEPTH, mode=Mode.SUBTRACT)

    # Sketch18 → Cut-Extrude15 (cut)
    with BuildSketch(Plane.XY.offset(0.15)):
        with Locations((-1.25, -23.75)):
            Circle(SKETCH18_R)
    extrude(amount=-CUT_EXTRUDE15_DEPTH, mode=Mode.SUBTRACT)

    # Sketch19 → Cut-Extrude16 (cut)
    with BuildSketch(Plane.XY.offset(0.15)):
        with Locations((-1.25, -26.25)):
            Circle(SKETCH19_R)
    extrude(amount=-CUT_EXTRUDE16_DEPTH, mode=Mode.SUBTRACT)

    # Sketch20 → Cut-Extrude17 (cut)
    with BuildSketch(Plane.XY.offset(0.15)):
        with Locations((-1.25, -33.9)):
            Circle(SKETCH20_R)
    extrude(amount=-CUT_EXTRUDE17_DEPTH, mode=Mode.SUBTRACT)

    # Sketch21 → Cut-Extrude18 (cut)
    with BuildSketch(Plane.XY.offset(0.15)):
        with Locations((-1.25, -36.4)):
            Circle(SKETCH21_R)
    extrude(amount=-CUT_EXTRUDE18_DEPTH, mode=Mode.SUBTRACT)

    # Sketch22 → Cut-Extrude19 (cut)
    with BuildSketch(Plane.XY.offset(0.15)):
        with Locations((-1.25, -44.05)):
            Circle(SKETCH22_R)
    extrude(amount=-CUT_EXTRUDE19_DEPTH, mode=Mode.SUBTRACT)

    # Sketch23 → Cut-Extrude20 (cut)
    with BuildSketch(Plane.XY.offset(0.15)):
        with Locations((-1.25, -46.55)):
            Circle(SKETCH23_R)
    extrude(amount=-CUT_EXTRUDE20_DEPTH, mode=Mode.SUBTRACT)


solid = part.part
